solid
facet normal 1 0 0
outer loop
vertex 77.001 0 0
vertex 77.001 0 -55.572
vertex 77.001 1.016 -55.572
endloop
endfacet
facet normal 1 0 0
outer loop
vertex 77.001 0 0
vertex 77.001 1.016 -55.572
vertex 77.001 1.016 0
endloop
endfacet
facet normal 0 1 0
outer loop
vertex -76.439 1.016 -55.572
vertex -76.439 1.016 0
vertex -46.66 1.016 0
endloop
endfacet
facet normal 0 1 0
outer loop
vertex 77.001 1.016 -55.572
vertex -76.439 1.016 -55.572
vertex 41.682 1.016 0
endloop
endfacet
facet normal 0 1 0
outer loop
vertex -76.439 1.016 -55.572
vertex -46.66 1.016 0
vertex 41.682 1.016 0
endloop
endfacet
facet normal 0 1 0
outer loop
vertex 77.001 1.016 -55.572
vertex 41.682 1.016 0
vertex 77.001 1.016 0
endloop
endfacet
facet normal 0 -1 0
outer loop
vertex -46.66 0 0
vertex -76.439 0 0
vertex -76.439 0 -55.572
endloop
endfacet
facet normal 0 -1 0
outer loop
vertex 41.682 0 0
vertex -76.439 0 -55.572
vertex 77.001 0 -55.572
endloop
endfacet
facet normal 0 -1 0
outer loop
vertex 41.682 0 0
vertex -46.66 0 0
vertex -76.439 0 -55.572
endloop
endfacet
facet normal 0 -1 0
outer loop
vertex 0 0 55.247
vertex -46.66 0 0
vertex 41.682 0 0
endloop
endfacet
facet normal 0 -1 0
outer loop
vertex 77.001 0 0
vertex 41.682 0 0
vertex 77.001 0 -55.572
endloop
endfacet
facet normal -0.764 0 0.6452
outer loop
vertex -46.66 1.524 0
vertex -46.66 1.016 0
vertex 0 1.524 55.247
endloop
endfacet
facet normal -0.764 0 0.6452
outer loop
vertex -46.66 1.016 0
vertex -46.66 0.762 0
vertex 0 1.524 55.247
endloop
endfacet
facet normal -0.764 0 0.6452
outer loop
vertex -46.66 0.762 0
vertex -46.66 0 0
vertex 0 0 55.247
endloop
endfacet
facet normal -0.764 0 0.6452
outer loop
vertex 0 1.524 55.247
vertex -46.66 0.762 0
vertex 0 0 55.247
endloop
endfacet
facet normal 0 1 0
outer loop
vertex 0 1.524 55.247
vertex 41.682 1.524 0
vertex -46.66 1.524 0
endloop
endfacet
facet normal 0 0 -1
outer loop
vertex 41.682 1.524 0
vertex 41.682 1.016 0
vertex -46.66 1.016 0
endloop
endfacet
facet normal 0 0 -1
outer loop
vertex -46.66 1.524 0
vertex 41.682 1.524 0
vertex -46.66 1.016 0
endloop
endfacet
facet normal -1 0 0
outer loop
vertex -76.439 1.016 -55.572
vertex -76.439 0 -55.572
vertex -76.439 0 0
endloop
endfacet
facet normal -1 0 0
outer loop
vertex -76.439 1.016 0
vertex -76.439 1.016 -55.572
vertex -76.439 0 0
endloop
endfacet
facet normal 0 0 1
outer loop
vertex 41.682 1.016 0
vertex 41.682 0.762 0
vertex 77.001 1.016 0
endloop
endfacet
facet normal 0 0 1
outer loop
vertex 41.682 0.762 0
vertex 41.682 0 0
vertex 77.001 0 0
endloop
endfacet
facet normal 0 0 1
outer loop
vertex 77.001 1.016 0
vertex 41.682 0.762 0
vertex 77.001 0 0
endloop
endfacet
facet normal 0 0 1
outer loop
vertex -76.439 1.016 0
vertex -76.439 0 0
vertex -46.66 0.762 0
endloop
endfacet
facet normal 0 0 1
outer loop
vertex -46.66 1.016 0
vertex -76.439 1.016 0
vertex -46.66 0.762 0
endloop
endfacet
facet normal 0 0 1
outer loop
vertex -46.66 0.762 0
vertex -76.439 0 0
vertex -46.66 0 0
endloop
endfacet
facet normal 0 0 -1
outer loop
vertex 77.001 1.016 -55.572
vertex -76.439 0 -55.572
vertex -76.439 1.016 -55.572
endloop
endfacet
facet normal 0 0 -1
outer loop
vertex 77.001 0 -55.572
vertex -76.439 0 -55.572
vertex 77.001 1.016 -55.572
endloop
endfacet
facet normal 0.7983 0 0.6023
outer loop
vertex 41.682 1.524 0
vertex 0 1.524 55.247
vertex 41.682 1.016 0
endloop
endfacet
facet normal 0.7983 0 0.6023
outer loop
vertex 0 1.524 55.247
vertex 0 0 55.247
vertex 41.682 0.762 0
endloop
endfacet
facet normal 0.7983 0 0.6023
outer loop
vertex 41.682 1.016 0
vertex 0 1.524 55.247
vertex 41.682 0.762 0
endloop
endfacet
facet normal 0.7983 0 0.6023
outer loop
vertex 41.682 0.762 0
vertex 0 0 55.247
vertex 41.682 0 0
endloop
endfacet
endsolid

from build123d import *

# Parameters (mm, degrees)
F34_W     = 153.4406170249
F34_H     = 55.5722899735
F35_DEPTH = 0.762
F37_DEPTH = 1.27
F39_DEPTH = 0.254
F40_DEPTH = 0.254


# Not quite as in the source:
# - the program builds the solid bodies; features that only make, move or delete a surface that nothing else refers to are left out


with BuildPart() as f35:
    # F34 (on Front) → F35 (new body)
    with BuildSketch(Plane.XZ):
        with Locations((0.281136483, -27.7861449867)):
            Rectangle(F34_W, F34_H)
    extrude(amount=-F35_DEPTH)

    # F36 (on Front) → F37 (join)
    with BuildSketch(Plane.XZ):
        Polygon((41.6817590594, 0), (0, 55.2465841174), (-46.6600246727, 0), align=None)
    extrude(amount=-F37_DEPTH)

    # F38 (on face) → F39 (join)
    with BuildSketch(Plane(origin=(0, 1.27, 0), x_dir=(-1, 0, 0), z_dir=(0, 1, 0))):
        Polygon((46.6600246727, 0), (0, 55.2465841174), (-41.6817590594, 0), align=None)
    extrude(amount=F39_DEPTH)

    # F40 (add): a face of the model
    f40_faces = [f35.faces().sort_by_distance(p)[0] for p in [
        (0.281136483, 0.762, -27.7861449867),
    ]]
    extrude(f40_faces, amount=F40_DEPTH)


solid = f35.part
